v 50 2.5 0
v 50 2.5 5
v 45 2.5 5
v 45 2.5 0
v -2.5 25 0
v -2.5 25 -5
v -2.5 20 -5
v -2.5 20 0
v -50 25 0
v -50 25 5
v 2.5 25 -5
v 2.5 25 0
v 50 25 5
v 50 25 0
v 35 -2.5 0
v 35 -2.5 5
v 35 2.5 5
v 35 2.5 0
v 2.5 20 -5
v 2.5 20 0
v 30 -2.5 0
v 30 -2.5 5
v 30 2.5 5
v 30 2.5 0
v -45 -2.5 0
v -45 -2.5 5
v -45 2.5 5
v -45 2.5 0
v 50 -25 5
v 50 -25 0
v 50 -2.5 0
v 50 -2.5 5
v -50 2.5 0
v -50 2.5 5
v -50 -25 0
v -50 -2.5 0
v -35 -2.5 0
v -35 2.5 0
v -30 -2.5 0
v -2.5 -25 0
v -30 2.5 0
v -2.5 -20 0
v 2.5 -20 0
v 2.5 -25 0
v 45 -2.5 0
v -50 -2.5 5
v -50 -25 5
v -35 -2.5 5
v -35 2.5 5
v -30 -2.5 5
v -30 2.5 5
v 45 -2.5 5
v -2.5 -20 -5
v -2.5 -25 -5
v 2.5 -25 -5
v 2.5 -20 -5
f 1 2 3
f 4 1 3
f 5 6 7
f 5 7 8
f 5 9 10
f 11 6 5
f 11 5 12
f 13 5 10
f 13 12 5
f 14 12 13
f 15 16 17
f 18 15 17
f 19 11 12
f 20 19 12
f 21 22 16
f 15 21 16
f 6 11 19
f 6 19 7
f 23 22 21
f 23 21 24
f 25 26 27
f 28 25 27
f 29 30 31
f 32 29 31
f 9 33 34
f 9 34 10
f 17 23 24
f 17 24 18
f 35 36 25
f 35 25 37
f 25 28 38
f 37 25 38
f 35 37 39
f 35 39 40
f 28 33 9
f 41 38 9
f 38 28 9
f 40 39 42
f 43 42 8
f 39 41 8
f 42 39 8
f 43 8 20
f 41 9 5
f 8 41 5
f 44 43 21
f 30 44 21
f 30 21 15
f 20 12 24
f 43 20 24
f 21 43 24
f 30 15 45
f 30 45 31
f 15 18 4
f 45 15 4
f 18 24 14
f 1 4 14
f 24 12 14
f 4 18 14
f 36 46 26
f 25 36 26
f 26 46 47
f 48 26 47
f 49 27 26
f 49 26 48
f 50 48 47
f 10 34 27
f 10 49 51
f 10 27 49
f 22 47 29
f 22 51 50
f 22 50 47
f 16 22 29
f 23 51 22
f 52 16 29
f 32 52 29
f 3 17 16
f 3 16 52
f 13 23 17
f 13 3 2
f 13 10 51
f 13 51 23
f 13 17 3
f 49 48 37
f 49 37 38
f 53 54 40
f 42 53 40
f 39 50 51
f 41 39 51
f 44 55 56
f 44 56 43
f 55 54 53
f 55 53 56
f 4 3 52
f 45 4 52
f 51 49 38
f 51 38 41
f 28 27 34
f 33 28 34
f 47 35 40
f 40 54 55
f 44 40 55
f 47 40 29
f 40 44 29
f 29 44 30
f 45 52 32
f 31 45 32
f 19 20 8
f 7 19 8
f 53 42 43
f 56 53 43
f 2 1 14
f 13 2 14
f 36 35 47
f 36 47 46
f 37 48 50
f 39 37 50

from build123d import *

# Parameters (mm, degrees)
F0_W     = 100
F0_H     = 50
F1_DEPTH = 5
F2_W     = 5
F2_H     = 5
F3_DEPTH = 5
F4_W     = 5
F4_H     = 5
F5_DEPTH = 5
F6_W     = 5
F6_H     = 5
F7_DEPTH = 5


with BuildPart() as f1:
    # F0 (on Top) → F1 (new body)
    with BuildSketch(Plane.XY):
        Rectangle(F0_W, F0_H)
    extrude(amount=F1_DEPTH)

    # F2 (on face) → F3 (join)
    with BuildSketch(Plane(origin=(0, 25, 0), x_dir=(-1, 0, 0), z_dir=(0, 1, 0))):
        with Locations((0, -2.5)):
            Rectangle(F2_W, F2_H)
    extrude(amount=-F3_DEPTH)

    # F4 (on face) → F5 (join)
    with BuildSketch(Plane.XZ.offset(25)):
        with Locations((0, -2.5)):
            Rectangle(F4_W, F4_H)
    extrude(amount=-F5_DEPTH)

    # F6 (on face) → F7 (cut, through all)
    with BuildSketch(Plane.XY.offset(5)):
        Polygon((-50, 2.5), (-50, 0), (-50, -2.5), (-45, -2.5), (-45, 2.5), align=None)
        with Locations((-32.5, 0)):
            Rectangle(F6_W, F6_H)
        with Locations((32.5, 0)):
            Rectangle(F6_W, F6_H)
        Polygon((45, 2.5), (45, -2.5), (50, -2.5), (50, 0), (50, 2.5), align=None)
    extrude(amount=-F7_DEPTH, mode=Mode.SUBTRACT)


solid = f1.part
